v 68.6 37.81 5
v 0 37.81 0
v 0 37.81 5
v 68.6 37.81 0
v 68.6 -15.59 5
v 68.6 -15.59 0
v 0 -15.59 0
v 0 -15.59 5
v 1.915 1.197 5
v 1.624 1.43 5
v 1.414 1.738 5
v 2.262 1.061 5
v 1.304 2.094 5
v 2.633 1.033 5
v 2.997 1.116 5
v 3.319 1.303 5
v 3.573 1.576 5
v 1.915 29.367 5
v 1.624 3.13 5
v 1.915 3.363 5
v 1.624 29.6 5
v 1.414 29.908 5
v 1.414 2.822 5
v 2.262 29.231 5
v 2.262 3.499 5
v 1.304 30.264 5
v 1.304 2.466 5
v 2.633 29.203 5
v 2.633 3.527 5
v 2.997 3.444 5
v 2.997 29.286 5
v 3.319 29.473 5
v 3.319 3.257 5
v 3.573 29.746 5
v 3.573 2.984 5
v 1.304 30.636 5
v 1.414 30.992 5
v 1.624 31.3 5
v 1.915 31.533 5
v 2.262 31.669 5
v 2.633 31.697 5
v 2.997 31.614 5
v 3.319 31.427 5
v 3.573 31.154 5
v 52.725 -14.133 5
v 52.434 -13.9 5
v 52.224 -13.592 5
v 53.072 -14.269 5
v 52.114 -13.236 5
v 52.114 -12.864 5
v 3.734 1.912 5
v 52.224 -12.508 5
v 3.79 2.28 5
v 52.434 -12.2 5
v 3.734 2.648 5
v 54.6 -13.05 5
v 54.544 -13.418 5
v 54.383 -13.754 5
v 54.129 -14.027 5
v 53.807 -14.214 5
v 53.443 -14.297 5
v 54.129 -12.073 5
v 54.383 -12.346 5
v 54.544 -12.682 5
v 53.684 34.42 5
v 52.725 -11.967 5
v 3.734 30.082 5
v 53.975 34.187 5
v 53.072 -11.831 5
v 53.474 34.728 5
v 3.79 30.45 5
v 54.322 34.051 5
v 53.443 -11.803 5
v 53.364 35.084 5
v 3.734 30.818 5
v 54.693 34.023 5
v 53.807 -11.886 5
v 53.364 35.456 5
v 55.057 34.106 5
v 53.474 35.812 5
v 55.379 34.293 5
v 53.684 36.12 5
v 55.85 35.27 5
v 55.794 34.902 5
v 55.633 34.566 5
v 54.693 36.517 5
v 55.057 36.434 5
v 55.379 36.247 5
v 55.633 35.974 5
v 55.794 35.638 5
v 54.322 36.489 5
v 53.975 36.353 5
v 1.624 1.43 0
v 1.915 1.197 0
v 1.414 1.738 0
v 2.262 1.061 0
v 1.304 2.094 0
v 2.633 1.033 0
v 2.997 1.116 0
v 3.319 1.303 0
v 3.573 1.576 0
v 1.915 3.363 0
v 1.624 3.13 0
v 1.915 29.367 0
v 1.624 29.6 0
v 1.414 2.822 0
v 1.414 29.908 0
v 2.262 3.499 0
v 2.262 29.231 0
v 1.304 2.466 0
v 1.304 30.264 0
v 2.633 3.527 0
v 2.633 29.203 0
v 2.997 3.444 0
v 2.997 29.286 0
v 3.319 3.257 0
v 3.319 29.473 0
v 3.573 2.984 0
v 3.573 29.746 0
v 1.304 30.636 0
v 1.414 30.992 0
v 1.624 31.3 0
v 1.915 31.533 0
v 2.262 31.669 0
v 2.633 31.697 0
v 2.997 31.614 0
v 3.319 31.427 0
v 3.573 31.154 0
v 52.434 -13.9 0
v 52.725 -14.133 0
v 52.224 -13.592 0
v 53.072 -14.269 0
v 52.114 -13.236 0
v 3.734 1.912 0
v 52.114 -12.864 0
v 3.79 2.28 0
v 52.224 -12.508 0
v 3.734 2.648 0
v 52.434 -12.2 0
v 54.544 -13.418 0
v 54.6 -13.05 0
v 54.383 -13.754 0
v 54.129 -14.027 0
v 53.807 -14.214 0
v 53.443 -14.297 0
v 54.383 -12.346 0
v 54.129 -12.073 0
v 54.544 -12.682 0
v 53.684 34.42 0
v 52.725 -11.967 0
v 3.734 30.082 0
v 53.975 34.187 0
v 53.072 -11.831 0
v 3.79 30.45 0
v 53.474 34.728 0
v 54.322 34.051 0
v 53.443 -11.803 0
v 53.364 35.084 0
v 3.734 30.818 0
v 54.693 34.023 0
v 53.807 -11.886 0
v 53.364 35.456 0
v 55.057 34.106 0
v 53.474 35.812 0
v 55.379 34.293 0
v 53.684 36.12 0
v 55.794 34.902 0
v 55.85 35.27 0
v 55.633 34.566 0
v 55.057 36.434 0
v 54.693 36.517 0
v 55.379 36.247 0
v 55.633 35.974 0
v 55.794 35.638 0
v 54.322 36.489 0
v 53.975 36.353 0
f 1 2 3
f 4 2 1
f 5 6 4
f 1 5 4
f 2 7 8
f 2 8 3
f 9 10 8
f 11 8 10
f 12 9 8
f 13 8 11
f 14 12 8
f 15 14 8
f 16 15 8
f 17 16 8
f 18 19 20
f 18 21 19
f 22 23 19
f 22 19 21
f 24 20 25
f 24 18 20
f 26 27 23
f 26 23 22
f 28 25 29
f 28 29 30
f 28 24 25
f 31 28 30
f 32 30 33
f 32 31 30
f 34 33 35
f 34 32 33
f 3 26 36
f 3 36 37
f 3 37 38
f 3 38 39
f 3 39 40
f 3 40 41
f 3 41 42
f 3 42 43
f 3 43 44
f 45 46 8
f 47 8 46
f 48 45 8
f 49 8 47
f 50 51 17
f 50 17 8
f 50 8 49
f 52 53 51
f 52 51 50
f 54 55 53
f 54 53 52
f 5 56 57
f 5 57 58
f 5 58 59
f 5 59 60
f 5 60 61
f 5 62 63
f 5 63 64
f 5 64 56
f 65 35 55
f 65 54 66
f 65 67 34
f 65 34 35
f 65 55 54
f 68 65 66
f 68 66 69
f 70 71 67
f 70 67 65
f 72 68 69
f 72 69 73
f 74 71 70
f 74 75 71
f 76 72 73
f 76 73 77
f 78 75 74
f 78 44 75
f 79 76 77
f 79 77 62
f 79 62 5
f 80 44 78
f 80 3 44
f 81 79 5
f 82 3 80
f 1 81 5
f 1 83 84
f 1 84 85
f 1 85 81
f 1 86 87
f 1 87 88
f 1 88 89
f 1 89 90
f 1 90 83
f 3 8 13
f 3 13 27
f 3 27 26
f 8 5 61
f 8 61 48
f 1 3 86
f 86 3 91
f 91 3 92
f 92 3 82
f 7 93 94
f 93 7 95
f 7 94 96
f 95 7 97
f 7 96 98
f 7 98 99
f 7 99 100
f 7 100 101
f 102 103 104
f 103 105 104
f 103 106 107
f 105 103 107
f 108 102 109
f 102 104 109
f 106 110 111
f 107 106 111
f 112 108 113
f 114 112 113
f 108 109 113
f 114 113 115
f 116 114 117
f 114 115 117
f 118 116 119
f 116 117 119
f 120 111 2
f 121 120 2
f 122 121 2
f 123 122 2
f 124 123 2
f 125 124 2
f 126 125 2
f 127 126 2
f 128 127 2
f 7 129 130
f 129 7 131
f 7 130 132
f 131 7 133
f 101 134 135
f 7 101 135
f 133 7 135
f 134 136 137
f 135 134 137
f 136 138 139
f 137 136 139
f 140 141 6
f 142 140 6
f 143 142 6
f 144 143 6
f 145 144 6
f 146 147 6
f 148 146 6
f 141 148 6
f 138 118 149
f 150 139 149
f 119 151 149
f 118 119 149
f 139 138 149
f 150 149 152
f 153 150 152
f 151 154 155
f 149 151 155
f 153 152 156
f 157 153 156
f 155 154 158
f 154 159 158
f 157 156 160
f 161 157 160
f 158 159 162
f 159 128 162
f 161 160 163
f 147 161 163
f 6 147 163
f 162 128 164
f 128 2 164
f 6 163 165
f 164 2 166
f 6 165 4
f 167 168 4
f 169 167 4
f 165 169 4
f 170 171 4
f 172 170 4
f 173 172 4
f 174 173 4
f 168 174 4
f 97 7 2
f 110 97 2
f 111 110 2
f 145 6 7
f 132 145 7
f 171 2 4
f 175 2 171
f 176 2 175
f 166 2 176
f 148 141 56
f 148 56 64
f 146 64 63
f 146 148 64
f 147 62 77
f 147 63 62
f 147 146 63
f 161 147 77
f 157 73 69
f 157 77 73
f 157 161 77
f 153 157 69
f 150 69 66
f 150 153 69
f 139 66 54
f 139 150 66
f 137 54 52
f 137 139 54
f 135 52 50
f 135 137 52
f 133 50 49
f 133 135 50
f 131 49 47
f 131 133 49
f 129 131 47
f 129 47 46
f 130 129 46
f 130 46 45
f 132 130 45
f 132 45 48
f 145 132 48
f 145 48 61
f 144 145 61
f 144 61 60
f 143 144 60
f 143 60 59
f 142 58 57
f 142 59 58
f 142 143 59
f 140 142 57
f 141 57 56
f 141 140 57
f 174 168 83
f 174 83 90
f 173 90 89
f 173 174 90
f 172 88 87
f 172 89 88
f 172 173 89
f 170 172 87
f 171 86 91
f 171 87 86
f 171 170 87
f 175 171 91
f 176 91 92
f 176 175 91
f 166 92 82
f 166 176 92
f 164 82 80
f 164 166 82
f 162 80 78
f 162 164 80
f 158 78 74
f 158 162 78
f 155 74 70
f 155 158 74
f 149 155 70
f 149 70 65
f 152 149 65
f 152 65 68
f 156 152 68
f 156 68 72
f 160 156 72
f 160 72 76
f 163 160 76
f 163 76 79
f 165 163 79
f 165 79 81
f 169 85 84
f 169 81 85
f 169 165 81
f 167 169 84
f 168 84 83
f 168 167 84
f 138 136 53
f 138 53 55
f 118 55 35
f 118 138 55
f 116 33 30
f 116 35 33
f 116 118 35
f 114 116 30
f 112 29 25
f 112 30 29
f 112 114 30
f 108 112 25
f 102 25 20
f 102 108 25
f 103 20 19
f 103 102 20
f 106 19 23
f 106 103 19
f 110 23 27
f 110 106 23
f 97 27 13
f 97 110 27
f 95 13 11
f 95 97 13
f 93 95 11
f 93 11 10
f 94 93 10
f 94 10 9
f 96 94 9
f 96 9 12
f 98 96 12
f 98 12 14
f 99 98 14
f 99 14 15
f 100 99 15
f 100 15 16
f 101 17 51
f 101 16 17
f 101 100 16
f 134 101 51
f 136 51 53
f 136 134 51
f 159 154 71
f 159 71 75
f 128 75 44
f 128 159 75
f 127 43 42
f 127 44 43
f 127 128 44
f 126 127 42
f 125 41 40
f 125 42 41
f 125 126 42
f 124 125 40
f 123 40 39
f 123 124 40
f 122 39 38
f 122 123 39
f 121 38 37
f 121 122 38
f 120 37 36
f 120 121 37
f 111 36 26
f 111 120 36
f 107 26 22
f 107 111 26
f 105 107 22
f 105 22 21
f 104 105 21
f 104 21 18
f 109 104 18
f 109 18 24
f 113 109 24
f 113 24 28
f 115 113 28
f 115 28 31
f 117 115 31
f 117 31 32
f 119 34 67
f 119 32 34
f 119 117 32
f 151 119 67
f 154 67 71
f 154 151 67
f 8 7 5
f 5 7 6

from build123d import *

# Parameters (mm, degrees)
SKETCH4_W                = 68.600000001
SKETCH4_H                = 53.4
BRACKETBASE_DEPTH        = 5
MOUNTINGHOLES_DEPTH      = 79.489210088
MOUNTINGHOLES_DEPTH_BACK = 79.489210088
MOUNTINGHOLESSKETCH_R    = 1.25


with BuildPart() as part:
    # Sketch4 → bracketBase (new body)
    with BuildSketch(Plane.XY):
        with Locations((34.3, 11.110000001)):
            Rectangle(SKETCH4_W, SKETCH4_H)
    extrude(amount=BRACKETBASE_DEPTH)

    # mountingHolesSketch → mountingHoles (cut, two sides: drawn at the far end of the back side and taken through both)
    with BuildSketch(Plane.XY.offset(-MOUNTINGHOLES_DEPTH_BACK)):
        with Locations((2.54, 2.280000001)):
            Circle(MOUNTINGHOLESSKETCH_R)
        with Locations((2.54, 30.450000001)):
            Circle(MOUNTINGHOLESSKETCH_R)
        with Locations((54.600000001, 35.270000001)):
            Circle(MOUNTINGHOLESSKETCH_R)
        with Locations((53.350000001, -13.049999999)):
            Circle(MOUNTINGHOLESSKETCH_R)
    extrude(amount=MOUNTINGHOLES_DEPTH + MOUNTINGHOLES_DEPTH_BACK, mode=Mode.SUBTRACT)


solid = part.part
